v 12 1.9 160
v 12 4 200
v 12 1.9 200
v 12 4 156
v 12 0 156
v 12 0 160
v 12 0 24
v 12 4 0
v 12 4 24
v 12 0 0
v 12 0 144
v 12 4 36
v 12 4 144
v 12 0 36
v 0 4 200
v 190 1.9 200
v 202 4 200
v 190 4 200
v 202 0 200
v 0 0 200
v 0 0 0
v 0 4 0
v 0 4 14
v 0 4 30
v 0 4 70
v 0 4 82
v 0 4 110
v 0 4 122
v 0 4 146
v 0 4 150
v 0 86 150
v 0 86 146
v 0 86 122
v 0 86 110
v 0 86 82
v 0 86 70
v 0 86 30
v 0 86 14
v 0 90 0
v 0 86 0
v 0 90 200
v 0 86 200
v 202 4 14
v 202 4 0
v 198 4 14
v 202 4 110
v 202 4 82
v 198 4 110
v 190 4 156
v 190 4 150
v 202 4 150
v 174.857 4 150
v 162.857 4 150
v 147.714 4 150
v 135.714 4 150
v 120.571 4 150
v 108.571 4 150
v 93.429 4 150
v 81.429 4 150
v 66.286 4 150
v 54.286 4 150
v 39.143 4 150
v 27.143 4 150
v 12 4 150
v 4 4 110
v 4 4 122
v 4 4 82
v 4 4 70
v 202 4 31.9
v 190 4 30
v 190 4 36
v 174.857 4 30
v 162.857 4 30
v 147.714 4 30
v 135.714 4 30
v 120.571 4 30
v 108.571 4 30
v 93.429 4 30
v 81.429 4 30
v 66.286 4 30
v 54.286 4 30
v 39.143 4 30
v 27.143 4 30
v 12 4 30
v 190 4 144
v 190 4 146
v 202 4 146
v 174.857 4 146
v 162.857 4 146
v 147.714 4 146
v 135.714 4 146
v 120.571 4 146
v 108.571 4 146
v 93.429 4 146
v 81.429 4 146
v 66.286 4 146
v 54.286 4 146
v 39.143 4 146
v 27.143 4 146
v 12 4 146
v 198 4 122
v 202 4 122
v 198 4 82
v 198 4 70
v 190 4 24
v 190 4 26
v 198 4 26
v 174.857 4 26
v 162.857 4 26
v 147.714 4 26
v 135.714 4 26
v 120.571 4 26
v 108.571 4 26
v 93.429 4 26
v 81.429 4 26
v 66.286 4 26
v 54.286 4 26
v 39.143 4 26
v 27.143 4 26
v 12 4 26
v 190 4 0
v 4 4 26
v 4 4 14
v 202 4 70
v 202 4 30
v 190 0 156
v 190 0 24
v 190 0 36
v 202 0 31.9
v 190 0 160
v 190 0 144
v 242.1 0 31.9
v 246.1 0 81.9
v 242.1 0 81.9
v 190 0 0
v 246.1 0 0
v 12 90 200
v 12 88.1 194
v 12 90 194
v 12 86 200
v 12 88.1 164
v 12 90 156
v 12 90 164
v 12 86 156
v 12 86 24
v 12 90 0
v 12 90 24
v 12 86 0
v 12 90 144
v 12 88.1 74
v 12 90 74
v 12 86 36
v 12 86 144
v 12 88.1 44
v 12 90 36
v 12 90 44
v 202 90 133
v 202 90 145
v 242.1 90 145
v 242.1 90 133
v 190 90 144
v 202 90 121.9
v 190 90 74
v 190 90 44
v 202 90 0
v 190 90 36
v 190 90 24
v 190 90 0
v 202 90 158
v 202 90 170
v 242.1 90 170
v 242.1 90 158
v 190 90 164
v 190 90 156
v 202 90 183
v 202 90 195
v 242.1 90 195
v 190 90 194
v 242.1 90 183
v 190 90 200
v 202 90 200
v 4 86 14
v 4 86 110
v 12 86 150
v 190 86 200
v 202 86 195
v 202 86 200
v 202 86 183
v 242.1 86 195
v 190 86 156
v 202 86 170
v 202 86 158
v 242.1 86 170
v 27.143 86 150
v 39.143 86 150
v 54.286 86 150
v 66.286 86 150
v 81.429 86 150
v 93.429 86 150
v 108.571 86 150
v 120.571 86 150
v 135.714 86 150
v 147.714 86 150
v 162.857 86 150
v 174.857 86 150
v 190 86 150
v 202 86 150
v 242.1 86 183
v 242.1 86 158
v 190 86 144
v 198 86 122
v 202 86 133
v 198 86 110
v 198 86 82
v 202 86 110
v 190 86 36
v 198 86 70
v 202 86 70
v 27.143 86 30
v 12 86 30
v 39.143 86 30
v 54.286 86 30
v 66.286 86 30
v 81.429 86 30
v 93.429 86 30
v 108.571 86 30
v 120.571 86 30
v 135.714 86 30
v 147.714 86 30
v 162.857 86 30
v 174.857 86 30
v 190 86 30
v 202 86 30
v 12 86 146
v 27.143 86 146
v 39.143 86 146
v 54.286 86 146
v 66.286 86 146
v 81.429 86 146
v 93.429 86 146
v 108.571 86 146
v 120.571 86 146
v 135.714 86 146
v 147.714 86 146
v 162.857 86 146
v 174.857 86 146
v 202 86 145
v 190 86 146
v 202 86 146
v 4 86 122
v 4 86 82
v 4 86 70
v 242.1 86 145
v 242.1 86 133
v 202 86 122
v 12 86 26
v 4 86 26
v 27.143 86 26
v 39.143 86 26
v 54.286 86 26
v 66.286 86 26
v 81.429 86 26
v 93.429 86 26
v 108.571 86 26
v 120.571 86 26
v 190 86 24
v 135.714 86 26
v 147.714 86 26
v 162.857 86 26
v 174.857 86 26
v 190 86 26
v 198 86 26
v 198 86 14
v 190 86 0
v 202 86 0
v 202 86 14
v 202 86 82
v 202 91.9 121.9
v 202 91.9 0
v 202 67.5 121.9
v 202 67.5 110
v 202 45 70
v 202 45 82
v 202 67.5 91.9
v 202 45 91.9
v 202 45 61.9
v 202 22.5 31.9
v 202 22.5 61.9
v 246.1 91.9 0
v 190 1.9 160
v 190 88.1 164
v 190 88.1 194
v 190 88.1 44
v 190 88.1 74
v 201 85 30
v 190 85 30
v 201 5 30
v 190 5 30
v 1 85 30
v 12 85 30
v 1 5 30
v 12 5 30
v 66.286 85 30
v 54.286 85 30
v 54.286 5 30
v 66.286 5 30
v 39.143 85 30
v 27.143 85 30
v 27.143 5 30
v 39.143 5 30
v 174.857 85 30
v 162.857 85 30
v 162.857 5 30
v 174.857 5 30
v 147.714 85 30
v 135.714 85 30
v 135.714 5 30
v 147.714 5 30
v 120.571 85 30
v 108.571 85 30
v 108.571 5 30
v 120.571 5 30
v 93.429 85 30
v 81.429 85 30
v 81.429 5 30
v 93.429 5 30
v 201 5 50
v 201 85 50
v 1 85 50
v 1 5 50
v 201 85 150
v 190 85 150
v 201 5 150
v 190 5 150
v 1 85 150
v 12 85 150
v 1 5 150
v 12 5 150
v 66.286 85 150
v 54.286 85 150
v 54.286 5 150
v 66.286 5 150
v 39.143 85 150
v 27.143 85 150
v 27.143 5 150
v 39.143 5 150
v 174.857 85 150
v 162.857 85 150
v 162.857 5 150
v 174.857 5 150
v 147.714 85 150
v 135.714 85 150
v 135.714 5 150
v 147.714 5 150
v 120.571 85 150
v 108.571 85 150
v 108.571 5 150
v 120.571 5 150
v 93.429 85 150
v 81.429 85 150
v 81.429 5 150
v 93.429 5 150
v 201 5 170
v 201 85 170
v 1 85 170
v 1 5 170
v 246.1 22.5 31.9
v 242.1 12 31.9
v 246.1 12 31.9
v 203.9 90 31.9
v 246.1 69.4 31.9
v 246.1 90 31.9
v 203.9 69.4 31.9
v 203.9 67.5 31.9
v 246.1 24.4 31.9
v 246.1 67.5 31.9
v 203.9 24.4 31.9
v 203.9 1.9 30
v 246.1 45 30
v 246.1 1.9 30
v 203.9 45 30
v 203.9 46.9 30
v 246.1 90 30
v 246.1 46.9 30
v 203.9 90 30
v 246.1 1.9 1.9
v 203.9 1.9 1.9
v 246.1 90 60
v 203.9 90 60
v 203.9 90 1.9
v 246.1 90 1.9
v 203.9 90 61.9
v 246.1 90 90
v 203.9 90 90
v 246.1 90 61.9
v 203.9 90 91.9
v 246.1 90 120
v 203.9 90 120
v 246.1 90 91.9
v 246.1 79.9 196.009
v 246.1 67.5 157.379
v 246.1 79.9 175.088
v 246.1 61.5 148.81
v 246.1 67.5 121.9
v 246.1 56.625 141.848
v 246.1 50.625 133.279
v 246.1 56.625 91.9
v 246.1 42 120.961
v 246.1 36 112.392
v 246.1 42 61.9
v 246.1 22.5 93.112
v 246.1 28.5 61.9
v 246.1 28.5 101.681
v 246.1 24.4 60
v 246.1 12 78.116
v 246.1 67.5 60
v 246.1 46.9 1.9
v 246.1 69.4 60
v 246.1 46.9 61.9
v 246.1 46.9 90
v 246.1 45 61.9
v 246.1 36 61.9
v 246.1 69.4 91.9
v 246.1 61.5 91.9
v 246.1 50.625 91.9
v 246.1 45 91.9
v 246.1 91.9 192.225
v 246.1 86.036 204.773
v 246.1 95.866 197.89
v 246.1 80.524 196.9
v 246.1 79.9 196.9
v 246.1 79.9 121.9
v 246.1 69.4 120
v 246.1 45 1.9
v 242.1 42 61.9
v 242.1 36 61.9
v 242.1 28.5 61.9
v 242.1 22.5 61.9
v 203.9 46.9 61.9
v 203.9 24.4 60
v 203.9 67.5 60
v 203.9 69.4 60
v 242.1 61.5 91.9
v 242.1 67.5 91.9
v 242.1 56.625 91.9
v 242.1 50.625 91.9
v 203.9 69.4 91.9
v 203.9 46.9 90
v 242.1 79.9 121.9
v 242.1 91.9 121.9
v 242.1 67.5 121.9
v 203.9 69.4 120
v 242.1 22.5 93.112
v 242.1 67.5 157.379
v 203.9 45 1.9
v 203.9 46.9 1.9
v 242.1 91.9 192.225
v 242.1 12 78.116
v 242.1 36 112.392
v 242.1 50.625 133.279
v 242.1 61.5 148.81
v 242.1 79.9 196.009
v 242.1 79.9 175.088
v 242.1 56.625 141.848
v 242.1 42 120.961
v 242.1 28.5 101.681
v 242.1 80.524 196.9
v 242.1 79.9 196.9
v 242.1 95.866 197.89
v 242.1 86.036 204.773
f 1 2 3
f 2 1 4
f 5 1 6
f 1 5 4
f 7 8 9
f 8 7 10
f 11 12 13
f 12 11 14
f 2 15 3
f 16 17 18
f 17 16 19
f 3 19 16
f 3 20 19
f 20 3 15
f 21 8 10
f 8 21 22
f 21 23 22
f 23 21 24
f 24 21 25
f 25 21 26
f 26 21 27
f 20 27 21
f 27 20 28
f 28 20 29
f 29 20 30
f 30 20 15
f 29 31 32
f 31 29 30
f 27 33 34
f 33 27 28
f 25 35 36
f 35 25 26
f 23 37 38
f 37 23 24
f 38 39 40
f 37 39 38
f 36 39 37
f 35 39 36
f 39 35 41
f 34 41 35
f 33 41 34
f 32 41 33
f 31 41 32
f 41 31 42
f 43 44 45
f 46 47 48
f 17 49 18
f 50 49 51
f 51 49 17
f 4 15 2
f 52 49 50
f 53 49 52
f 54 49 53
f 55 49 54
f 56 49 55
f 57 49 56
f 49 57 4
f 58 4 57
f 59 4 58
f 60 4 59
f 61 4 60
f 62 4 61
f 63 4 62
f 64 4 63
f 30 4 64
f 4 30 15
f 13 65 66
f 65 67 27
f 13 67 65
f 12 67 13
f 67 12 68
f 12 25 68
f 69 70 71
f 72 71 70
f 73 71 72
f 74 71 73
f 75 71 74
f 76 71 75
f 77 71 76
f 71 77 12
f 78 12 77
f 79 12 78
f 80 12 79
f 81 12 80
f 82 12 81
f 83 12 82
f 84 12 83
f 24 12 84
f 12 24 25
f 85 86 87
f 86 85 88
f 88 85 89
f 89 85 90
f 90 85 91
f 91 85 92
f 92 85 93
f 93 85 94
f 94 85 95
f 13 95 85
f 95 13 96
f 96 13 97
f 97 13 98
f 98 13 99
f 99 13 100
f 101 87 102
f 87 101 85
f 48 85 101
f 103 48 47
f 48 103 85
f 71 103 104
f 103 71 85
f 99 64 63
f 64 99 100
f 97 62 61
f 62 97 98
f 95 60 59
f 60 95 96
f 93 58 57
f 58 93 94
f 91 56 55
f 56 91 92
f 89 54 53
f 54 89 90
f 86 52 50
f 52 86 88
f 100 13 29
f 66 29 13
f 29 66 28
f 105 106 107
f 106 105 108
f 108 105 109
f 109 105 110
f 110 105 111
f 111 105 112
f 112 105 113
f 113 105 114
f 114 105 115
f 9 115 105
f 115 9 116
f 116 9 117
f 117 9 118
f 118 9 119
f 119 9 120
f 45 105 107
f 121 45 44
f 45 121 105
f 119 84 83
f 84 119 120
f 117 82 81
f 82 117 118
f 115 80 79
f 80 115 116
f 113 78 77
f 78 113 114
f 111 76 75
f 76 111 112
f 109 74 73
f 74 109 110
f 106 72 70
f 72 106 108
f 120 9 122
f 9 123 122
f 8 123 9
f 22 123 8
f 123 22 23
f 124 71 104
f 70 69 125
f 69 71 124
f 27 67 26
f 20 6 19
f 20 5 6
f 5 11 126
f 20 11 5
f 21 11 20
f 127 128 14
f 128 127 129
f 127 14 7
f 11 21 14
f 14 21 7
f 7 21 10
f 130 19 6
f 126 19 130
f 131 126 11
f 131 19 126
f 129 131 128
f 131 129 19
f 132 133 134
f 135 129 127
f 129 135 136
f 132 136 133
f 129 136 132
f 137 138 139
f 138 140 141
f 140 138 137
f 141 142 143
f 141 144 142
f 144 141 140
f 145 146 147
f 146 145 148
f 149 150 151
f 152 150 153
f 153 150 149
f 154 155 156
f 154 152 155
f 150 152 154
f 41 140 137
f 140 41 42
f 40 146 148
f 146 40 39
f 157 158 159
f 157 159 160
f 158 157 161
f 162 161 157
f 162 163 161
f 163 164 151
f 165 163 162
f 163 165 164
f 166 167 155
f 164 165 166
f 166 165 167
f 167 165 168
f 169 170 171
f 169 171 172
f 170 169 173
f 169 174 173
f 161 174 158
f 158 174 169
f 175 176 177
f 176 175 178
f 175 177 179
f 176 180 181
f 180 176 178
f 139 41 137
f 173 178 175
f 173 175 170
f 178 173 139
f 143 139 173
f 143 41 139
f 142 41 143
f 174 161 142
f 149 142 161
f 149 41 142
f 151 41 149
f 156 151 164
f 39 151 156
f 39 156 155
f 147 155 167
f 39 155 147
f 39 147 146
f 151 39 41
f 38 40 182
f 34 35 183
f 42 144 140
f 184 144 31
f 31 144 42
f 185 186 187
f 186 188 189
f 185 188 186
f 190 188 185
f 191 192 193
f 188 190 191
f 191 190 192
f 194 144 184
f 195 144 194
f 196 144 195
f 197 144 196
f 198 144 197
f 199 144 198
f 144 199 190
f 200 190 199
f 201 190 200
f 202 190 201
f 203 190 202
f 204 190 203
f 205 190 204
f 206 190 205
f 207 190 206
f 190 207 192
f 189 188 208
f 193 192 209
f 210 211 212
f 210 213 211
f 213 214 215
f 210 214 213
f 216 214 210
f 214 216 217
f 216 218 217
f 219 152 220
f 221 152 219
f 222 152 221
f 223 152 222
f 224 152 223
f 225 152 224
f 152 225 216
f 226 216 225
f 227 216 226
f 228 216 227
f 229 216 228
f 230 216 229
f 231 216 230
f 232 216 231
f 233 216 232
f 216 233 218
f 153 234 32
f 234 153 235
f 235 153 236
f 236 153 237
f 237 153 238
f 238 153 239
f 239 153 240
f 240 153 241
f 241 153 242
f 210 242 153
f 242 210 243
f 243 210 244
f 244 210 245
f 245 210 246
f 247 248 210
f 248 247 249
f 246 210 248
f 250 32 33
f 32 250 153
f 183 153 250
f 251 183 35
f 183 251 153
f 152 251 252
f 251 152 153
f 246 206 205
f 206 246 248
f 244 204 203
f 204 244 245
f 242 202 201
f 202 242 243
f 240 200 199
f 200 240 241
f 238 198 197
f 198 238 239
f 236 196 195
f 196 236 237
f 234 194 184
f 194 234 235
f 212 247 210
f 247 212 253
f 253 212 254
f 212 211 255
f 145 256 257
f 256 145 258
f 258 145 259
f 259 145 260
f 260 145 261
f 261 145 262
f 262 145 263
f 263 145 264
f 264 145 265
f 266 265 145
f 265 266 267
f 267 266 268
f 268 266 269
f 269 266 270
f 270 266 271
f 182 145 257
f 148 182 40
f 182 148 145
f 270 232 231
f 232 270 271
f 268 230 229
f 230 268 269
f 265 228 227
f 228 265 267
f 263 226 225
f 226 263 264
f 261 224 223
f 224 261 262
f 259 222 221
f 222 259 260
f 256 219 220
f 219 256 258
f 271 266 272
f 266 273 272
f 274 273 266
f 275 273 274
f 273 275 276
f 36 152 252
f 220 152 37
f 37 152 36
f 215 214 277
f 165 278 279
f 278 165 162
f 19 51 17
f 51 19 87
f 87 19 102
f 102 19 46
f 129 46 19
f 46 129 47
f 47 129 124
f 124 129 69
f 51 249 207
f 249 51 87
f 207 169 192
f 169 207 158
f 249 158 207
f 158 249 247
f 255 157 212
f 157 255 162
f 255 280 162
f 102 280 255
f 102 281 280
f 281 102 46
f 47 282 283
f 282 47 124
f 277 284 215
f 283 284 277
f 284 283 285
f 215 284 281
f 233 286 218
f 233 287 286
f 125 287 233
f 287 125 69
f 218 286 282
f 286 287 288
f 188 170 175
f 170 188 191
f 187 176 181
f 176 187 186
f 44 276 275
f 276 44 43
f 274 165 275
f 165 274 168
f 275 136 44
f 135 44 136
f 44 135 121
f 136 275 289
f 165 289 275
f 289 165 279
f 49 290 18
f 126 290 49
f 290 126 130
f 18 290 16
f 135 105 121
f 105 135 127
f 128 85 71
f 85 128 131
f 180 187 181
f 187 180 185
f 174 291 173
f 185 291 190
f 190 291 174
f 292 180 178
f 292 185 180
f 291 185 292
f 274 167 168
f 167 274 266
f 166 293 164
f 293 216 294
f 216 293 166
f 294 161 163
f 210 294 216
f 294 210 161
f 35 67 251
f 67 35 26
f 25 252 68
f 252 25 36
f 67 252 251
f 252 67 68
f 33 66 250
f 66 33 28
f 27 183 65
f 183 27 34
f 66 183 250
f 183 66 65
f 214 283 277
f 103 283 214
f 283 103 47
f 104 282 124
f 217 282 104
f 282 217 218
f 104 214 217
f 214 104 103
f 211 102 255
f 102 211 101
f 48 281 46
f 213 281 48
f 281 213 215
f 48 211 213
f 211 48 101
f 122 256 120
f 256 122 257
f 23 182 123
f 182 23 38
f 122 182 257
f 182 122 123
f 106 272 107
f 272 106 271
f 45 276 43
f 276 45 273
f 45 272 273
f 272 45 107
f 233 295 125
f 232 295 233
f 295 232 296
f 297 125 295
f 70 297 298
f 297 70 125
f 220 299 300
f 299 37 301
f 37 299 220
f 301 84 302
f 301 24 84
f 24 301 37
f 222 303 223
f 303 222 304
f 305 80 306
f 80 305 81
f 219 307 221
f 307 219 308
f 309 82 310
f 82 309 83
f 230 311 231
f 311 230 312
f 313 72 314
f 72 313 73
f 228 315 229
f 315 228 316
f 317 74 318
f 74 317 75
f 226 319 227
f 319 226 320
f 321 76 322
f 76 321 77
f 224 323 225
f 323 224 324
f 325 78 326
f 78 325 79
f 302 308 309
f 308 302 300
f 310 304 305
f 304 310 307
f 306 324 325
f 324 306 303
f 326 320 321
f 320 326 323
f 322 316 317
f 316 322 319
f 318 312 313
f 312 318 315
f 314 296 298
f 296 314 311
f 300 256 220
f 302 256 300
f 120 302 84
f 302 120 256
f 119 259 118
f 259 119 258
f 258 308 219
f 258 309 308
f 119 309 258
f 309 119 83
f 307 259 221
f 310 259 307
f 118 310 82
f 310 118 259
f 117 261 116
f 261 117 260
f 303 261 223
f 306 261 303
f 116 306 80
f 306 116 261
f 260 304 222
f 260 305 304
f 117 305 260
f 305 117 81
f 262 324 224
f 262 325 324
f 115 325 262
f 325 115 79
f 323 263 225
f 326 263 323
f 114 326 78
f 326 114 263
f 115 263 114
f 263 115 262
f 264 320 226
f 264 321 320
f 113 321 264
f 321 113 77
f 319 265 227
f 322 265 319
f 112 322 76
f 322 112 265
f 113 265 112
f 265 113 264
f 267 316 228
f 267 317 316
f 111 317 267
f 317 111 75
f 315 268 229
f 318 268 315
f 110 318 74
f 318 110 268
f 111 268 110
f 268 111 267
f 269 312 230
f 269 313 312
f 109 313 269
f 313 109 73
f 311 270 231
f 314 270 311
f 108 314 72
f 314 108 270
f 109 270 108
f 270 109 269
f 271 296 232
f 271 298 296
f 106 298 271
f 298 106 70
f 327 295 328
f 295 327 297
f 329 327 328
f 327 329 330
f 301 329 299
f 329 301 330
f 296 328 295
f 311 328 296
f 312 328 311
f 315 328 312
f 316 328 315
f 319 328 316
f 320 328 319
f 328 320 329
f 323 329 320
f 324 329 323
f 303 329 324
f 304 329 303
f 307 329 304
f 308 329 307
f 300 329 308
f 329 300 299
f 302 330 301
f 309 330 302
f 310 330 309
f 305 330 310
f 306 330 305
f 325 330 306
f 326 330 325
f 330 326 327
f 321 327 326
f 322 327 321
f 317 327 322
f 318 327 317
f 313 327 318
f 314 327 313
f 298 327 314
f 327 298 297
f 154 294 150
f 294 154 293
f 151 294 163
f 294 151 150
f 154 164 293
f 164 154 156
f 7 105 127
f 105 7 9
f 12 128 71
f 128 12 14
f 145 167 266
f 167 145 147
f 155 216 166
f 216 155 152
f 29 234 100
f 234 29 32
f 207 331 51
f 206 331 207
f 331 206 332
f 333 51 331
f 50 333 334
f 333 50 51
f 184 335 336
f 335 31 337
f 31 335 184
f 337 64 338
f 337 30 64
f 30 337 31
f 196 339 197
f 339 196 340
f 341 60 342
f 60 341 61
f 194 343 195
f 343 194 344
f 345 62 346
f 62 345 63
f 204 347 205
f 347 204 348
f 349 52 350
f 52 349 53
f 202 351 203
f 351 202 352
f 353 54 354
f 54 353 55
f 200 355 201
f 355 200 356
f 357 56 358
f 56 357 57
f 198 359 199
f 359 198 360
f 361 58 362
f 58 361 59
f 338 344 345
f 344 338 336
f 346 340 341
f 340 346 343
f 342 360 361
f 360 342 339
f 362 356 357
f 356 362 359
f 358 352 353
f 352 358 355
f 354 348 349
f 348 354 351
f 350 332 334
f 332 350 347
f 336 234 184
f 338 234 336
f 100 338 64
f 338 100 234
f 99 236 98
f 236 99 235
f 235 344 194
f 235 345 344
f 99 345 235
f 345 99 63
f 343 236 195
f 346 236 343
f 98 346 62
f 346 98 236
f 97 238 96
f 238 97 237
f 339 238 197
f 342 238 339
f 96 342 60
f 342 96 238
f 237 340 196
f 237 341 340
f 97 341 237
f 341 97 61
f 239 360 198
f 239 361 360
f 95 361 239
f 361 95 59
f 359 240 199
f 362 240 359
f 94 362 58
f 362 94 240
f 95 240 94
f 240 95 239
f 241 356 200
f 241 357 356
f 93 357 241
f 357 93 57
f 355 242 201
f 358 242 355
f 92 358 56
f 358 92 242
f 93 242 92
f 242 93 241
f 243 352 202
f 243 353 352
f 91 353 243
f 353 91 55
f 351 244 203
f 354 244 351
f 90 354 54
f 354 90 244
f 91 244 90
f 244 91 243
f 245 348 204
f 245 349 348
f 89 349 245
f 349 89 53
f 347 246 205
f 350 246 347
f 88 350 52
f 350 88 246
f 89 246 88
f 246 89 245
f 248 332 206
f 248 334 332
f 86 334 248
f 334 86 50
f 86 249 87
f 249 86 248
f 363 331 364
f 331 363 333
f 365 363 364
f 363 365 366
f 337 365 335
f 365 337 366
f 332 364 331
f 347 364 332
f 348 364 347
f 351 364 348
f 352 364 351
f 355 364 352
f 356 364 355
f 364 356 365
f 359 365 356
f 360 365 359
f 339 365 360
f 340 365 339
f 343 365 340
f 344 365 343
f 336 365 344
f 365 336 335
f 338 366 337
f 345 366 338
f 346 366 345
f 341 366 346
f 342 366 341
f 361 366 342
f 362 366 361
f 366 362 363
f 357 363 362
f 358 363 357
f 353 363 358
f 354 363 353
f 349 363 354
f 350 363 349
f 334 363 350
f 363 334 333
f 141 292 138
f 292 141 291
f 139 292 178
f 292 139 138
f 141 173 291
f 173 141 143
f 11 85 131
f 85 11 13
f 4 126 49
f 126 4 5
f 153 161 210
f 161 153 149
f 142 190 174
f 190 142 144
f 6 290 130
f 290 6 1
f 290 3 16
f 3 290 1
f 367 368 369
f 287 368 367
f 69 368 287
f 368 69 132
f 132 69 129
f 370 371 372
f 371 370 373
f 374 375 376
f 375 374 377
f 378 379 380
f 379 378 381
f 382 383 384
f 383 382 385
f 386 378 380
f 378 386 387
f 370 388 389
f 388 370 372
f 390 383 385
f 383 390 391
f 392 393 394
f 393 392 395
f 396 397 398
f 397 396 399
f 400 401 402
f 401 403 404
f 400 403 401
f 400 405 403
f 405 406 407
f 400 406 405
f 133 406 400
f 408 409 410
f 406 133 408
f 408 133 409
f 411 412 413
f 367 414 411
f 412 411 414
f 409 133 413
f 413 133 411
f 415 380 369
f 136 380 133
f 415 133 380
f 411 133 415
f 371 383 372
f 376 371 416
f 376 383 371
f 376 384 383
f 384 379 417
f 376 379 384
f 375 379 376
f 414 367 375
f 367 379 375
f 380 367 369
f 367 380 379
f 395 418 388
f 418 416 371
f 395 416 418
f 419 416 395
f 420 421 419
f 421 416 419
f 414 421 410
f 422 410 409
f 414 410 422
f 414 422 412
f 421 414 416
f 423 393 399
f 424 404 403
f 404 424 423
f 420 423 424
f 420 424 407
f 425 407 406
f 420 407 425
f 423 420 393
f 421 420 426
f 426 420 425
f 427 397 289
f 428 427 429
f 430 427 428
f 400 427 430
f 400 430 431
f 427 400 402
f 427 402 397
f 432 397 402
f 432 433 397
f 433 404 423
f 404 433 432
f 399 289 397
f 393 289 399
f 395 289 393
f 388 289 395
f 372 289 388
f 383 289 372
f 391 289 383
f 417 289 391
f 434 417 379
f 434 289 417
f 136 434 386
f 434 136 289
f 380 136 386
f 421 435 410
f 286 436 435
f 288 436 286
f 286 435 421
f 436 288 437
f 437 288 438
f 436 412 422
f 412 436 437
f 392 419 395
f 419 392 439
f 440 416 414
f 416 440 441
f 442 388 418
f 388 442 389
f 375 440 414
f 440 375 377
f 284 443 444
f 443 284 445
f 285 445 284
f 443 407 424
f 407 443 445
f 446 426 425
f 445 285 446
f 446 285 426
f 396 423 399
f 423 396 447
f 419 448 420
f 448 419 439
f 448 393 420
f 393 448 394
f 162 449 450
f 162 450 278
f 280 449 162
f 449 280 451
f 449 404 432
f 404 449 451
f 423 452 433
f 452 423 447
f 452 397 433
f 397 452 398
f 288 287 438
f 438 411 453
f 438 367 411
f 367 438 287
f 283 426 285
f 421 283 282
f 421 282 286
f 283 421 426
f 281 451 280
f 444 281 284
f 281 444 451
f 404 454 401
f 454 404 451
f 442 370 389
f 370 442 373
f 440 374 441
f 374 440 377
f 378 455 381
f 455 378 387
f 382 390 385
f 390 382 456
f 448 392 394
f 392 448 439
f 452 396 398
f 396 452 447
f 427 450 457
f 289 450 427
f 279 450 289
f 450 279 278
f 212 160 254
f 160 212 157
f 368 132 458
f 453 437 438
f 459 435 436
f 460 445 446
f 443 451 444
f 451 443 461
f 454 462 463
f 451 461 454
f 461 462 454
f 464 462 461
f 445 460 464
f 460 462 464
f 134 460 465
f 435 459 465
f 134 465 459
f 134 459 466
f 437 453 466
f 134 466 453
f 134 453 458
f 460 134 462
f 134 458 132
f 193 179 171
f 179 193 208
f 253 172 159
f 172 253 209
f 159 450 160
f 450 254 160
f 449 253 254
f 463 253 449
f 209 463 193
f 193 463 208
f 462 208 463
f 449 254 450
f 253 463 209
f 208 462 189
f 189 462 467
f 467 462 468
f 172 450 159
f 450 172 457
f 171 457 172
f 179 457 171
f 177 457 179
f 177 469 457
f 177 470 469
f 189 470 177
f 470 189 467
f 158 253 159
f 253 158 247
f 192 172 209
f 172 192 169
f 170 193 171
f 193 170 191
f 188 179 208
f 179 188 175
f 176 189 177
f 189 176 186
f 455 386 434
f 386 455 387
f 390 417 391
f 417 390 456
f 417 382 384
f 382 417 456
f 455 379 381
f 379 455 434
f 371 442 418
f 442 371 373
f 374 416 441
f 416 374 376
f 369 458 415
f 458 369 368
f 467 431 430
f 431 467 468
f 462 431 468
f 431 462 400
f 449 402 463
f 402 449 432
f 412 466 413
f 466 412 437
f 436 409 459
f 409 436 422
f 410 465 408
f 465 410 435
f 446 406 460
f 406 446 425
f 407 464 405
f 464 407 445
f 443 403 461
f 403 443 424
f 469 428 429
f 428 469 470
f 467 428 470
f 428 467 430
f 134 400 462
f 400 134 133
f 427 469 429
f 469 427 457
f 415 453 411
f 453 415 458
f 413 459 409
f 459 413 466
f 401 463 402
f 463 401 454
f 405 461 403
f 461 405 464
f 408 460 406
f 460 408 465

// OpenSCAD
// vigas:
// 12x6 http://www.maderasnavalcarnero.com/producto/836/viga-laminada-de-abeto-secc-12-x-6-cm.php
//      http://www.hguillen.com/2011/03/vigas-cuartones-y-listones/
// 10x10


// parámetros de los materiales:

ancho_viga = 12;
fondo_viga = 4;

ancho_liston = 6;
fondo_liston = 4;
grosor_tabla = 1.9;


// parámetros de la cama:

fondo_colchon_ = 80; 
largo_colchon_ = 200;

margen_colchon = 1; // margen del colchon por cada lateral

alto_colchon = 20;

alto_vigas = 200;
alto_litera = 120;

soportes_inferiores = 8;

output_materials = false;

// parámetros calculados en función de otros:
fondo_colchon =  80 + margen_colchon * 2;
largo_colchon = 200 + margen_colchon * 2;
_fondo_cama = fondo_colchon + fondo_viga*2;


module viga(len, invert=false) {
     if (invert) {
        color("BurlyWood") cube([fondo_viga,ancho_viga,len]);
     } else {
        color("BurlyWood") cube([ancho_viga,fondo_viga,len]);
     }
     if (output_materials) echo("viga longitud: ", len);
}

module liston(len, invert=false) {
     if (invert) {
        color("BurlyWood") cube([fondo_liston,ancho_liston,len]);
     } else {
        color("BurlyWood") cube([ancho_liston,fondo_liston,len]);
     }
     if (output_materials) echo("liston longitud: ", len);
}

module tabla(ancho, alto) {
    color("SaddleBrown") cube([grosor_tabla, ancho, alto]);
    if (output_materials) echo("tabla: ",ancho," x ",alto," x ", grosor_tabla);
}




module colchon() {
    translate([margen_colchon, margen_colchon, 0]) color ("white") cube([largo_colchon_, fondo_colchon_, alto_colchon]);
}
module cama() {
    // patas que suben
    for (i=[0:1]) {
         translate([i * (largo_colchon - ancho_viga), 0, 0]) {
            viga(alto_vigas);
            translate([0,fondo_viga + fondo_colchon ,0]) {
                 viga(alto_vigas);
            }
        }
    }

    // frontal litera
    translate([ancho_viga, grosor_tabla, alto_litera + alto_colchon+20]) rotate([0, 0, -90 ]) tabla(largo_colchon-ancho_viga*2, 40);

    // refuerzos estructurales
    for(j=[0:1]) {
        for(i=[0:1]) {
            
            translate([(largo_colchon-fondo_viga)*j, fondo_viga, 70+40*i]) 
                rotate([-90, -90, 0]) viga(fondo_colchon);
        }
        // refuerzo inferior estructural
        translate([(largo_colchon-fondo_viga)*j, fondo_viga, 14]) 
                rotate([-90, -90, 0]) viga(fondo_colchon);
    }
    

    // camas 
    for (i=[0:1]) {
        translate([0, 0, alto_litera * i]) {
         
            // colchon   
            translate([0,fondo_viga,30]) { colchon(); }
            
            for (j=[0:soportes_inferiores-1]) {
                // soportes inferiores colchon
                translate([ancho_viga + j*((largo_colchon-ancho_viga)/(soportes_inferiores-1)), fondo_viga ,18+ancho_viga]) {
                    rotate([0,90,90]) viga(fondo_colchon, true);
                }
            }

            // panel trasero
            translate([ancho_viga, 
                       fondo_colchon + fondo_viga*2,
                       alto_colchon + 24]) { rotate([0, 0, -90 ]) 
                                             tabla(largo_colchon-ancho_viga*2, 30);}
            
            // vigas a los laterales del colchon
            translate([ancho_viga, 0 ,24+ancho_viga]) {
                rotate([0,90,0]) viga(largo_colchon-ancho_viga * 2);
            }
                
            // viga posterior
            translate([ancho_viga, fondo_colchon+fondo_viga,24+ancho_viga]) {
                rotate([0,90,0]) viga(largo_colchon-ancho_viga * 2);
            }
            
        }
    }
}

peldanos_escalera = 4;
largo_escalera = 90;
ancho_escalera = 46-grosor_tabla;
alto_peldano=30;

_largo_peldano = largo_escalera / peldanos_escalera;
_alto_escalera = peldanos_escalera * alto_peldano;

//cama();
// escalera ========

// peldaños 

module peldanos() {
    translate([0,grosor_tabla,0]) rotate([-90,-90,0]) tabla(ancho_escalera, largo_escalera - grosor_tabla);
        
    for (i=[0:peldanos_escalera-1]) {
         translate([0,largo_escalera ,grosor_tabla + (i+1) * alto_peldano])
            rotate([90,90,0]) tabla(ancho_escalera, largo_escalera - (i*_largo_peldano)-grosor_tabla);
        
    }

    translate([0, largo_escalera, 0]) {
        rotate([90,0,90]) tabla(_alto_escalera + grosor_tabla, ancho_escalera);
    }
    translate([0, 0, 0]) {
        rotate([90,0,90]) {
            tabla(alto_peldano + grosor_tabla, ancho_escalera);
        }
    }
    // resto de tablas frontales peldaños
    for(i=[1:peldanos_escalera-1])  {
        translate([0, _largo_peldano*i, alto_peldano*i+grosor_tabla]) {
            rotate([90,0,90]) tabla(alto_peldano, ancho_escalera);
        }
    }
     tabla(largo_escalera, alto_peldano+grosor_tabla);
       for(i=[1:peldanos_escalera-1]) {
        translate([0,_largo_peldano*i,grosor_tabla + alto_peldano*i]) tabla(largo_escalera-_largo_peldano*i+grosor_tabla,alto_peldano);
    }
    
    // refuerzos peldanos
    // bajo
    translate([0,largo_escalera/2,grosor_tabla])
        rotate([90,0,90]) tabla(alto_peldano-grosor_tabla,ancho_escalera);
    // siguiente
    translate([0,_largo_peldano*(peldanos_escalera-1),grosor_tabla+alto_peldano])
        rotate([90,0,90]) tabla(alto_peldano-grosor_tabla,ancho_escalera);
    
    // pie barandilla 0
    translate([ancho_escalera,0,alto_peldano+grosor_tabla]) rotate([0,0,90]) viga(50);
    
    // pie barandilla 1
    translate([ancho_escalera,largo_escalera-ancho_viga+grosor_tabla,alto_peldano*(peldanos_escalera)+grosor_tabla]) rotate([0,0,90]) viga(75);
    
    // pie barandilla 2
    translate([ancho_escalera, _largo_peldano*1, alto_peldano*(2)+grosor_tabla]) rotate([0,0,90]) liston(50);
    translate([ancho_escalera, _largo_peldano*1.6, alto_peldano*(2)+grosor_tabla]) rotate([0,0,90]) liston(60);
    
    
    // pie barandilla 3
    translate([ancho_escalera, _largo_peldano*2.25, alto_peldano*(3)+grosor_tabla]) rotate([0,0,90]) liston(50);
    // pie barandilla 3
    translate([ancho_escalera, _largo_peldano*3-ancho_liston, alto_peldano*(3)+grosor_tabla]) rotate([0,0,90]) liston(70);
    
    // barandilla
    translate([ancho_escalera, 0, alto_peldano+50+grosor_tabla]) rotate([-35,0,0]) rotate([0,0,90]) viga(150);
    
    // union barandilla <-> cama x3 
    for (i=[1:3]) {
        translate([0,
                   largo_escalera-fondo_viga,
                   alto_peldano*peldanos_escalera+i*(75/3)]) 
            rotate([0, 90, 0]) viga(ancho_escalera-fondo_viga);
    }
}

cama();
translate([largo_colchon,0,0]) peldanos();
